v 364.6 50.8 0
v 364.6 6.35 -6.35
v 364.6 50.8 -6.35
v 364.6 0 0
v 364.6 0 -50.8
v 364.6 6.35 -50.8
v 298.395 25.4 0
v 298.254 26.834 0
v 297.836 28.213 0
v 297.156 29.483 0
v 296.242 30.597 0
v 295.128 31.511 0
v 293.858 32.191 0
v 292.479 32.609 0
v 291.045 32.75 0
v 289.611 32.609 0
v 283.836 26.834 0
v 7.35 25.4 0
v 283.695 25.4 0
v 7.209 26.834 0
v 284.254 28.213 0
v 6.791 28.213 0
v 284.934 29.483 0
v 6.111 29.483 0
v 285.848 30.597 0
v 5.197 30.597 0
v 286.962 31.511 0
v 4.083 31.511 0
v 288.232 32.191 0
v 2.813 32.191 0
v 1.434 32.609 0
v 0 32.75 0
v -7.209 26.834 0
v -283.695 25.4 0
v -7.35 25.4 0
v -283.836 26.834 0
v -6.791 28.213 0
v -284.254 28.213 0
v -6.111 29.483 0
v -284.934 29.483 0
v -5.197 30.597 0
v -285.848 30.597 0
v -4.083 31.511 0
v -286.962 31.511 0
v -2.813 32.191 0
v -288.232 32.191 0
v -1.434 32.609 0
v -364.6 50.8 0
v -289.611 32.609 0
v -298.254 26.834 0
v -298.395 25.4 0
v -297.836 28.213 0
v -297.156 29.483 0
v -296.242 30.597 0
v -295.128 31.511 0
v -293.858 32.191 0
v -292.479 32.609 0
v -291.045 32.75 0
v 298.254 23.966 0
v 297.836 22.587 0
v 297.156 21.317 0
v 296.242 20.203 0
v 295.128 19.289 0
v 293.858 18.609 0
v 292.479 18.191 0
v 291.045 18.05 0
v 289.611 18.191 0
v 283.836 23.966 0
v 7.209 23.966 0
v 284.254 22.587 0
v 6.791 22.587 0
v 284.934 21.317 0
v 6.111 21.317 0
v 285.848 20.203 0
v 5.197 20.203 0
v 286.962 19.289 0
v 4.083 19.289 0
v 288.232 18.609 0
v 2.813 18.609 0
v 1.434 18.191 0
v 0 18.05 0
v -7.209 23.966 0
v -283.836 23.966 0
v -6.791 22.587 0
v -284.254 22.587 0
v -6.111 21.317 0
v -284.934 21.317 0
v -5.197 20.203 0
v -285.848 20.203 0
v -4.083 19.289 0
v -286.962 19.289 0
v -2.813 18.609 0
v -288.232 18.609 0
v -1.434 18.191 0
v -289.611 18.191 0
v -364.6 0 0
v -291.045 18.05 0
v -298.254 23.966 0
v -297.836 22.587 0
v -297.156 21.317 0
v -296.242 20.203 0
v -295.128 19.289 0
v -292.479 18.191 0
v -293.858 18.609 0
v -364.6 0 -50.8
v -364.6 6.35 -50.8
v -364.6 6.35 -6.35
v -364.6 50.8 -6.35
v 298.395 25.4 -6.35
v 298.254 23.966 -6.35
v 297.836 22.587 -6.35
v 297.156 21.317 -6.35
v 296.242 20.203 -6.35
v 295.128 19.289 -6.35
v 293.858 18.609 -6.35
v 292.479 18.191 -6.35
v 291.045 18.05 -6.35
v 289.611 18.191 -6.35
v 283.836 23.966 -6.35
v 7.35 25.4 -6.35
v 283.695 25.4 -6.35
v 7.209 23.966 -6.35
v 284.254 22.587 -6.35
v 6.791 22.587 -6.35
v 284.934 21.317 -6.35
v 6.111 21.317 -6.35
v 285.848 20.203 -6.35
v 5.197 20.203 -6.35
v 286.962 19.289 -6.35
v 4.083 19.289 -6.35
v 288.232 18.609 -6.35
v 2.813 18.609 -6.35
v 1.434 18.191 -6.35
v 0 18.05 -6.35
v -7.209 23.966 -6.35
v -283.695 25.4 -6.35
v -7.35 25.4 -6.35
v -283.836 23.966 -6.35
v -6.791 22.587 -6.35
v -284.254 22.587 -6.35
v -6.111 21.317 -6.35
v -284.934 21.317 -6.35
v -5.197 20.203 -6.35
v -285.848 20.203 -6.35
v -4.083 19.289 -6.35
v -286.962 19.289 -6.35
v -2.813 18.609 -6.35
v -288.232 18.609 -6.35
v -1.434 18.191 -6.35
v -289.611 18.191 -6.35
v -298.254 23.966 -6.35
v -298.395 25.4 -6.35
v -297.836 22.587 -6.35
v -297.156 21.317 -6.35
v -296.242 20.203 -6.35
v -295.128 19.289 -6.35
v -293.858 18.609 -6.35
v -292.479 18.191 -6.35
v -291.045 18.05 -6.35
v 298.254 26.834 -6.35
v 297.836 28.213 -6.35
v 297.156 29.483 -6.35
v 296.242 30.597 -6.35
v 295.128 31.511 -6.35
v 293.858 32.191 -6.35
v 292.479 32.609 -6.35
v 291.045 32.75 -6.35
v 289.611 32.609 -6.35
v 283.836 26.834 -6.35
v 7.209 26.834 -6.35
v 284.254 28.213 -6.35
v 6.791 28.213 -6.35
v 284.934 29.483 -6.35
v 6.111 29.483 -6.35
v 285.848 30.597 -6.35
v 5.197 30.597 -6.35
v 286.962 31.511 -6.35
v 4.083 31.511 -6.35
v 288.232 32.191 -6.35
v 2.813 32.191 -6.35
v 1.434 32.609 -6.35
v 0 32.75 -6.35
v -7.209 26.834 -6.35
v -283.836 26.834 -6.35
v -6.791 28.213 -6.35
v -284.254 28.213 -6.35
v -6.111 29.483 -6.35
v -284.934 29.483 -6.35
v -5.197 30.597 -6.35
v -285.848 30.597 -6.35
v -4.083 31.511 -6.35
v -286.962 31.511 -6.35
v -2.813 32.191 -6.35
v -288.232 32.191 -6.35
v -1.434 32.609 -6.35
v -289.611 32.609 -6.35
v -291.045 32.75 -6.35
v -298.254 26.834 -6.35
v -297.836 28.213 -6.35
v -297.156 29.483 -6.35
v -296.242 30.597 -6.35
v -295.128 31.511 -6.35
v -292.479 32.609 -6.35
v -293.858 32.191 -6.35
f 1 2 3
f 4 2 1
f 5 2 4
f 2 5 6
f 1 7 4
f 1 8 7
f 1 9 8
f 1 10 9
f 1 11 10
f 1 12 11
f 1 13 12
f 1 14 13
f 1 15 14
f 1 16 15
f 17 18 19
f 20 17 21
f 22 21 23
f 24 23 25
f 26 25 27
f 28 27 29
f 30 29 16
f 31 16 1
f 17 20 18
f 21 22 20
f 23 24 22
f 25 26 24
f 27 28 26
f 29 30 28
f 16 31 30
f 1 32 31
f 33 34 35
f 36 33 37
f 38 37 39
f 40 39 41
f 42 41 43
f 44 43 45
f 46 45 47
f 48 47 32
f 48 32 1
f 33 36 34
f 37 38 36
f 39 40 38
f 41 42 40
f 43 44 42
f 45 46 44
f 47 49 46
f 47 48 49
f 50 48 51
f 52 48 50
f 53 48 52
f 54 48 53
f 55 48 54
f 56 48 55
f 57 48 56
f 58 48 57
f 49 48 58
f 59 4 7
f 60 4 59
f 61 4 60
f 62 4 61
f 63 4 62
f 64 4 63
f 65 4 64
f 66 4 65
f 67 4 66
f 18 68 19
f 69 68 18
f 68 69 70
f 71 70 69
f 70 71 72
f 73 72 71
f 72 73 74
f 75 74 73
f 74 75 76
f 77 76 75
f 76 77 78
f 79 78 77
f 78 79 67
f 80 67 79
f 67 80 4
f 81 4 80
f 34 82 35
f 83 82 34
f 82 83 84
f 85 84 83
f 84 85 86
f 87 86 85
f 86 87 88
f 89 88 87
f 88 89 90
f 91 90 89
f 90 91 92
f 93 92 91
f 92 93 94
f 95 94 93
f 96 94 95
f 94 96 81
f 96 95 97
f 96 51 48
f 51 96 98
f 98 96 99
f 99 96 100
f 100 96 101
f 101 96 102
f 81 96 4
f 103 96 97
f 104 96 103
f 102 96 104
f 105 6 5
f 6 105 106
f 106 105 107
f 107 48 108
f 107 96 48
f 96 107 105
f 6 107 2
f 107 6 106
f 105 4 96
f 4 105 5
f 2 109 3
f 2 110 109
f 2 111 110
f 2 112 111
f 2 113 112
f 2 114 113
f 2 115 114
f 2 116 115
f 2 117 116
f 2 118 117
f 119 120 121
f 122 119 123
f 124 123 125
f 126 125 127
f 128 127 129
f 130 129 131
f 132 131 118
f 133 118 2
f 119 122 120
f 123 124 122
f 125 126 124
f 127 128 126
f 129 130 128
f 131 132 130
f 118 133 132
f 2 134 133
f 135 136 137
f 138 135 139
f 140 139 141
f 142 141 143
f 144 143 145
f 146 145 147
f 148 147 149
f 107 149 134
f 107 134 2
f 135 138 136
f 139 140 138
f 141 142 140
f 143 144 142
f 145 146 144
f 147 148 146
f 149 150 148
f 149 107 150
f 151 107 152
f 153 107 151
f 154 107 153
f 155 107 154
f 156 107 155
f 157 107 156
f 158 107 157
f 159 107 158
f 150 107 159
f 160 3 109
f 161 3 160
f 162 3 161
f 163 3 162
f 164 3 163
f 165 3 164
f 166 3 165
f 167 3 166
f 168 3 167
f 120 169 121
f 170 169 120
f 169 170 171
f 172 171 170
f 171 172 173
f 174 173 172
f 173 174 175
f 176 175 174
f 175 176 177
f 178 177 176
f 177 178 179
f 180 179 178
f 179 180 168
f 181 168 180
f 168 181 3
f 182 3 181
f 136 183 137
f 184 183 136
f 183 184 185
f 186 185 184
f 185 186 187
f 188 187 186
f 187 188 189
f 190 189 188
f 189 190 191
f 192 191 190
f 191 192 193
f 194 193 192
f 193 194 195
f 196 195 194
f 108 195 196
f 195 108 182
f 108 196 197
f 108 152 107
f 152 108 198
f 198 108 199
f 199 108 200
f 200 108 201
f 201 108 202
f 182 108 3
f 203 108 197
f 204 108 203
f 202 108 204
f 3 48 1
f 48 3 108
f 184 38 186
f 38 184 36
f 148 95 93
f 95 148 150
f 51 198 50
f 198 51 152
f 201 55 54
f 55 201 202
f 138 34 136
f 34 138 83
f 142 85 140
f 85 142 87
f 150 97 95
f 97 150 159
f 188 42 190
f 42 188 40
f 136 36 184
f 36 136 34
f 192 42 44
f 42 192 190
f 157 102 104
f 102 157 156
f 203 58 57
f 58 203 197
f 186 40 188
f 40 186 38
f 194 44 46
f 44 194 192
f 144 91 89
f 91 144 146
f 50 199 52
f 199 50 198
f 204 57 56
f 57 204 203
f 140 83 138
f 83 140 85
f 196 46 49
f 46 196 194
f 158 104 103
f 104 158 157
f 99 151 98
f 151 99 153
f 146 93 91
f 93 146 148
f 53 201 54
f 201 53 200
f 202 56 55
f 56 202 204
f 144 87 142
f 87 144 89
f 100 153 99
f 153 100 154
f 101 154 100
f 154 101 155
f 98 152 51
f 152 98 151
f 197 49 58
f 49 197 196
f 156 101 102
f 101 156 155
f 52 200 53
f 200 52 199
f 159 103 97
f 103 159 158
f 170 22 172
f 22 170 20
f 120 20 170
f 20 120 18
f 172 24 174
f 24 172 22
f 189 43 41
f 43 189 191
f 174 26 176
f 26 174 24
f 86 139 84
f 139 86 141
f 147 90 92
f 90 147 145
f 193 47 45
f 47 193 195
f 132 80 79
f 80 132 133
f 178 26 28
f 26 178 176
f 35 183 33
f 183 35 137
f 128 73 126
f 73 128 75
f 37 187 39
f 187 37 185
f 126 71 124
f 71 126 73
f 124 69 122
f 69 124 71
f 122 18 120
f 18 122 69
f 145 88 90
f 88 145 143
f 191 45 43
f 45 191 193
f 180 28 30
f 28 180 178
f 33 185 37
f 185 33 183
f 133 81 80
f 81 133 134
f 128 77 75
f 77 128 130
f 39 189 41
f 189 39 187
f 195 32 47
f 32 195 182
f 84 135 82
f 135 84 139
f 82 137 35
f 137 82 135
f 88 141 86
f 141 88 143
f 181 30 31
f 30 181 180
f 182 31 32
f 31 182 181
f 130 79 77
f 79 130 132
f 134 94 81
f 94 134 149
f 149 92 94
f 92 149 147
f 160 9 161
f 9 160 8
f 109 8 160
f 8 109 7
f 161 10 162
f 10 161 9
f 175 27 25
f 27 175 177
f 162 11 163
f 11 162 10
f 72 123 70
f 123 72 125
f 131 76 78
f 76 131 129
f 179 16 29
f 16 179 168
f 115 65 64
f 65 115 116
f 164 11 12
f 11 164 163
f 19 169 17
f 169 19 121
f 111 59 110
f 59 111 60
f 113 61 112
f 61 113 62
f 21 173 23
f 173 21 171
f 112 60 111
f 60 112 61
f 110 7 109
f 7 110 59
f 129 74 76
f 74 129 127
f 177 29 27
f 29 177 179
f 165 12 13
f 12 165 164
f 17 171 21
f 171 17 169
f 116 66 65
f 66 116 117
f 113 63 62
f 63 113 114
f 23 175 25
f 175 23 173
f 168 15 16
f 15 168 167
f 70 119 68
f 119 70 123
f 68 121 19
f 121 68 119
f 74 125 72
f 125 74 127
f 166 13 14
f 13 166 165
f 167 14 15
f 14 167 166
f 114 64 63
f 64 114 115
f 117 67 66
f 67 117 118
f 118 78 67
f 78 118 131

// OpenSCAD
// Part A8: Platform Transverse Angle Iron (Front and Rear)
// Material: 2"×2"×1/4" Angle Iron (50.8mm leg × 6.35mm thickness)
// Quantity: 2 pieces (1 front near pivot, 1 rear at far end)
// Location: Folding standing platform, cross-bracing under deck plate
//
// These run transversely (left-right) across the platform deck,
// spaced 1/4" from the side angle mounting brackets

include <../../lifetrac_v25_params.scad>

// =============================================================================
// PART DIMENSIONS
// =============================================================================

_leg = is_undef(PLATFORM_ANGLE_LEG) ? 50.8 : PLATFORM_ANGLE_LEG;       // 2" = 50.8mm
_thick = is_undef(PLATFORM_ANGLE_THICK) ? 6.35 : PLATFORM_ANGLE_THICK; // 1/4" = 6.35mm
_track_width = is_undef(TRACK_WIDTH) ? 900 : TRACK_WIDTH;
_sandwich = is_undef(SANDWICH_SPACING) ? 120 : SANDWICH_SPACING;
_panel_thick = is_undef(PANEL_THICKNESS) ? 12.7 : PANEL_THICKNESS;
_pivot_x = is_undef(PLATFORM_PIVOT_X) ? 300 : PLATFORM_PIVOT_X;
_side_gap = is_undef(PLATFORM_SIDE_GAP) ? 6.35 : PLATFORM_SIDE_GAP;
_bolt_dia = is_undef(PLATFORM_BOLT_DIA) ? 9.525 : PLATFORM_BOLT_DIA;
_clearance = is_undef(PLATFORM_BOLT_CLEARANCE) ? 0.5 : PLATFORM_BOLT_CLEARANCE;
_end_offset = is_undef(PLATFORM_TRANSVERSE_BOLT_END_OFFSET) ? 50.8 : PLATFORM_TRANSVERSE_BOLT_END_OFFSET;

// Calculate length: spans between side angle brackets with 1/4" clearance each side
_angle_x = _pivot_x - _side_gap;  // X position of side angles from center
_clearance_gap = 6.35;  // 1/4" clearance from L brackets

PART_A8_LENGTH = 2 * (_angle_x - _clearance_gap);
PART_A8_LEG = _leg;
PART_A8_THICK = _thick;

// =============================================================================
// MAIN MODULE
// =============================================================================

/**
 * Part A8: Platform Transverse Angle Iron
 * L-profile angle iron running left-right across platform deck
 * show_holes: if true, renders deck mounting holes
 */
module _part_a8_platform_transverse_angle(show_holes=true) {
    length = PART_A8_LENGTH;
    leg = PART_A8_LEG;
    thick = PART_A8_THICK;
    hole_dia = _bolt_dia + _clearance;
    
    color("DimGray")
    difference() {
        union() {
            // Vertical Leg (full length, face at Y=0)
            translate([-length/2, 0, -leg])
            cube([length, thick, leg]);
            
            // Horizontal Leg (face at Z=0)
            translate([-length/2, 0, -thick])
            cube([length, leg, thick]);
        }
        
        if (show_holes) {
            // Deck Mounting Holes (through horizontal leg)
            // 3 holes: near each end and center
            for (x_pos = [-length/2 + _end_offset, 0, length/2 - _end_offset]) {
                translate([x_pos, leg/2, 0])
                cylinder(d=hole_dia, h=thick*3, center=true, $fn=32);
            }
        }
    }
}

// =============================================================================
// RENDER
// =============================================================================

_part_a8_platform_transverse_angle(show_holes=true);

echo("=== PART A8: Platform Transverse Angle Iron ===");
echo("Length:", PART_A8_LENGTH, "mm (", PART_A8_LENGTH/25.4, "in)");
echo("Leg:", PART_A8_LEG, "mm (2 inches)");
echo("Thickness:", PART_A8_THICK, "mm (1/4 inch)");
echo("Holes: 3 per piece (deck mounting, 3/8\" dia)");
echo("Quantity needed: 2 pieces (front and rear)");
